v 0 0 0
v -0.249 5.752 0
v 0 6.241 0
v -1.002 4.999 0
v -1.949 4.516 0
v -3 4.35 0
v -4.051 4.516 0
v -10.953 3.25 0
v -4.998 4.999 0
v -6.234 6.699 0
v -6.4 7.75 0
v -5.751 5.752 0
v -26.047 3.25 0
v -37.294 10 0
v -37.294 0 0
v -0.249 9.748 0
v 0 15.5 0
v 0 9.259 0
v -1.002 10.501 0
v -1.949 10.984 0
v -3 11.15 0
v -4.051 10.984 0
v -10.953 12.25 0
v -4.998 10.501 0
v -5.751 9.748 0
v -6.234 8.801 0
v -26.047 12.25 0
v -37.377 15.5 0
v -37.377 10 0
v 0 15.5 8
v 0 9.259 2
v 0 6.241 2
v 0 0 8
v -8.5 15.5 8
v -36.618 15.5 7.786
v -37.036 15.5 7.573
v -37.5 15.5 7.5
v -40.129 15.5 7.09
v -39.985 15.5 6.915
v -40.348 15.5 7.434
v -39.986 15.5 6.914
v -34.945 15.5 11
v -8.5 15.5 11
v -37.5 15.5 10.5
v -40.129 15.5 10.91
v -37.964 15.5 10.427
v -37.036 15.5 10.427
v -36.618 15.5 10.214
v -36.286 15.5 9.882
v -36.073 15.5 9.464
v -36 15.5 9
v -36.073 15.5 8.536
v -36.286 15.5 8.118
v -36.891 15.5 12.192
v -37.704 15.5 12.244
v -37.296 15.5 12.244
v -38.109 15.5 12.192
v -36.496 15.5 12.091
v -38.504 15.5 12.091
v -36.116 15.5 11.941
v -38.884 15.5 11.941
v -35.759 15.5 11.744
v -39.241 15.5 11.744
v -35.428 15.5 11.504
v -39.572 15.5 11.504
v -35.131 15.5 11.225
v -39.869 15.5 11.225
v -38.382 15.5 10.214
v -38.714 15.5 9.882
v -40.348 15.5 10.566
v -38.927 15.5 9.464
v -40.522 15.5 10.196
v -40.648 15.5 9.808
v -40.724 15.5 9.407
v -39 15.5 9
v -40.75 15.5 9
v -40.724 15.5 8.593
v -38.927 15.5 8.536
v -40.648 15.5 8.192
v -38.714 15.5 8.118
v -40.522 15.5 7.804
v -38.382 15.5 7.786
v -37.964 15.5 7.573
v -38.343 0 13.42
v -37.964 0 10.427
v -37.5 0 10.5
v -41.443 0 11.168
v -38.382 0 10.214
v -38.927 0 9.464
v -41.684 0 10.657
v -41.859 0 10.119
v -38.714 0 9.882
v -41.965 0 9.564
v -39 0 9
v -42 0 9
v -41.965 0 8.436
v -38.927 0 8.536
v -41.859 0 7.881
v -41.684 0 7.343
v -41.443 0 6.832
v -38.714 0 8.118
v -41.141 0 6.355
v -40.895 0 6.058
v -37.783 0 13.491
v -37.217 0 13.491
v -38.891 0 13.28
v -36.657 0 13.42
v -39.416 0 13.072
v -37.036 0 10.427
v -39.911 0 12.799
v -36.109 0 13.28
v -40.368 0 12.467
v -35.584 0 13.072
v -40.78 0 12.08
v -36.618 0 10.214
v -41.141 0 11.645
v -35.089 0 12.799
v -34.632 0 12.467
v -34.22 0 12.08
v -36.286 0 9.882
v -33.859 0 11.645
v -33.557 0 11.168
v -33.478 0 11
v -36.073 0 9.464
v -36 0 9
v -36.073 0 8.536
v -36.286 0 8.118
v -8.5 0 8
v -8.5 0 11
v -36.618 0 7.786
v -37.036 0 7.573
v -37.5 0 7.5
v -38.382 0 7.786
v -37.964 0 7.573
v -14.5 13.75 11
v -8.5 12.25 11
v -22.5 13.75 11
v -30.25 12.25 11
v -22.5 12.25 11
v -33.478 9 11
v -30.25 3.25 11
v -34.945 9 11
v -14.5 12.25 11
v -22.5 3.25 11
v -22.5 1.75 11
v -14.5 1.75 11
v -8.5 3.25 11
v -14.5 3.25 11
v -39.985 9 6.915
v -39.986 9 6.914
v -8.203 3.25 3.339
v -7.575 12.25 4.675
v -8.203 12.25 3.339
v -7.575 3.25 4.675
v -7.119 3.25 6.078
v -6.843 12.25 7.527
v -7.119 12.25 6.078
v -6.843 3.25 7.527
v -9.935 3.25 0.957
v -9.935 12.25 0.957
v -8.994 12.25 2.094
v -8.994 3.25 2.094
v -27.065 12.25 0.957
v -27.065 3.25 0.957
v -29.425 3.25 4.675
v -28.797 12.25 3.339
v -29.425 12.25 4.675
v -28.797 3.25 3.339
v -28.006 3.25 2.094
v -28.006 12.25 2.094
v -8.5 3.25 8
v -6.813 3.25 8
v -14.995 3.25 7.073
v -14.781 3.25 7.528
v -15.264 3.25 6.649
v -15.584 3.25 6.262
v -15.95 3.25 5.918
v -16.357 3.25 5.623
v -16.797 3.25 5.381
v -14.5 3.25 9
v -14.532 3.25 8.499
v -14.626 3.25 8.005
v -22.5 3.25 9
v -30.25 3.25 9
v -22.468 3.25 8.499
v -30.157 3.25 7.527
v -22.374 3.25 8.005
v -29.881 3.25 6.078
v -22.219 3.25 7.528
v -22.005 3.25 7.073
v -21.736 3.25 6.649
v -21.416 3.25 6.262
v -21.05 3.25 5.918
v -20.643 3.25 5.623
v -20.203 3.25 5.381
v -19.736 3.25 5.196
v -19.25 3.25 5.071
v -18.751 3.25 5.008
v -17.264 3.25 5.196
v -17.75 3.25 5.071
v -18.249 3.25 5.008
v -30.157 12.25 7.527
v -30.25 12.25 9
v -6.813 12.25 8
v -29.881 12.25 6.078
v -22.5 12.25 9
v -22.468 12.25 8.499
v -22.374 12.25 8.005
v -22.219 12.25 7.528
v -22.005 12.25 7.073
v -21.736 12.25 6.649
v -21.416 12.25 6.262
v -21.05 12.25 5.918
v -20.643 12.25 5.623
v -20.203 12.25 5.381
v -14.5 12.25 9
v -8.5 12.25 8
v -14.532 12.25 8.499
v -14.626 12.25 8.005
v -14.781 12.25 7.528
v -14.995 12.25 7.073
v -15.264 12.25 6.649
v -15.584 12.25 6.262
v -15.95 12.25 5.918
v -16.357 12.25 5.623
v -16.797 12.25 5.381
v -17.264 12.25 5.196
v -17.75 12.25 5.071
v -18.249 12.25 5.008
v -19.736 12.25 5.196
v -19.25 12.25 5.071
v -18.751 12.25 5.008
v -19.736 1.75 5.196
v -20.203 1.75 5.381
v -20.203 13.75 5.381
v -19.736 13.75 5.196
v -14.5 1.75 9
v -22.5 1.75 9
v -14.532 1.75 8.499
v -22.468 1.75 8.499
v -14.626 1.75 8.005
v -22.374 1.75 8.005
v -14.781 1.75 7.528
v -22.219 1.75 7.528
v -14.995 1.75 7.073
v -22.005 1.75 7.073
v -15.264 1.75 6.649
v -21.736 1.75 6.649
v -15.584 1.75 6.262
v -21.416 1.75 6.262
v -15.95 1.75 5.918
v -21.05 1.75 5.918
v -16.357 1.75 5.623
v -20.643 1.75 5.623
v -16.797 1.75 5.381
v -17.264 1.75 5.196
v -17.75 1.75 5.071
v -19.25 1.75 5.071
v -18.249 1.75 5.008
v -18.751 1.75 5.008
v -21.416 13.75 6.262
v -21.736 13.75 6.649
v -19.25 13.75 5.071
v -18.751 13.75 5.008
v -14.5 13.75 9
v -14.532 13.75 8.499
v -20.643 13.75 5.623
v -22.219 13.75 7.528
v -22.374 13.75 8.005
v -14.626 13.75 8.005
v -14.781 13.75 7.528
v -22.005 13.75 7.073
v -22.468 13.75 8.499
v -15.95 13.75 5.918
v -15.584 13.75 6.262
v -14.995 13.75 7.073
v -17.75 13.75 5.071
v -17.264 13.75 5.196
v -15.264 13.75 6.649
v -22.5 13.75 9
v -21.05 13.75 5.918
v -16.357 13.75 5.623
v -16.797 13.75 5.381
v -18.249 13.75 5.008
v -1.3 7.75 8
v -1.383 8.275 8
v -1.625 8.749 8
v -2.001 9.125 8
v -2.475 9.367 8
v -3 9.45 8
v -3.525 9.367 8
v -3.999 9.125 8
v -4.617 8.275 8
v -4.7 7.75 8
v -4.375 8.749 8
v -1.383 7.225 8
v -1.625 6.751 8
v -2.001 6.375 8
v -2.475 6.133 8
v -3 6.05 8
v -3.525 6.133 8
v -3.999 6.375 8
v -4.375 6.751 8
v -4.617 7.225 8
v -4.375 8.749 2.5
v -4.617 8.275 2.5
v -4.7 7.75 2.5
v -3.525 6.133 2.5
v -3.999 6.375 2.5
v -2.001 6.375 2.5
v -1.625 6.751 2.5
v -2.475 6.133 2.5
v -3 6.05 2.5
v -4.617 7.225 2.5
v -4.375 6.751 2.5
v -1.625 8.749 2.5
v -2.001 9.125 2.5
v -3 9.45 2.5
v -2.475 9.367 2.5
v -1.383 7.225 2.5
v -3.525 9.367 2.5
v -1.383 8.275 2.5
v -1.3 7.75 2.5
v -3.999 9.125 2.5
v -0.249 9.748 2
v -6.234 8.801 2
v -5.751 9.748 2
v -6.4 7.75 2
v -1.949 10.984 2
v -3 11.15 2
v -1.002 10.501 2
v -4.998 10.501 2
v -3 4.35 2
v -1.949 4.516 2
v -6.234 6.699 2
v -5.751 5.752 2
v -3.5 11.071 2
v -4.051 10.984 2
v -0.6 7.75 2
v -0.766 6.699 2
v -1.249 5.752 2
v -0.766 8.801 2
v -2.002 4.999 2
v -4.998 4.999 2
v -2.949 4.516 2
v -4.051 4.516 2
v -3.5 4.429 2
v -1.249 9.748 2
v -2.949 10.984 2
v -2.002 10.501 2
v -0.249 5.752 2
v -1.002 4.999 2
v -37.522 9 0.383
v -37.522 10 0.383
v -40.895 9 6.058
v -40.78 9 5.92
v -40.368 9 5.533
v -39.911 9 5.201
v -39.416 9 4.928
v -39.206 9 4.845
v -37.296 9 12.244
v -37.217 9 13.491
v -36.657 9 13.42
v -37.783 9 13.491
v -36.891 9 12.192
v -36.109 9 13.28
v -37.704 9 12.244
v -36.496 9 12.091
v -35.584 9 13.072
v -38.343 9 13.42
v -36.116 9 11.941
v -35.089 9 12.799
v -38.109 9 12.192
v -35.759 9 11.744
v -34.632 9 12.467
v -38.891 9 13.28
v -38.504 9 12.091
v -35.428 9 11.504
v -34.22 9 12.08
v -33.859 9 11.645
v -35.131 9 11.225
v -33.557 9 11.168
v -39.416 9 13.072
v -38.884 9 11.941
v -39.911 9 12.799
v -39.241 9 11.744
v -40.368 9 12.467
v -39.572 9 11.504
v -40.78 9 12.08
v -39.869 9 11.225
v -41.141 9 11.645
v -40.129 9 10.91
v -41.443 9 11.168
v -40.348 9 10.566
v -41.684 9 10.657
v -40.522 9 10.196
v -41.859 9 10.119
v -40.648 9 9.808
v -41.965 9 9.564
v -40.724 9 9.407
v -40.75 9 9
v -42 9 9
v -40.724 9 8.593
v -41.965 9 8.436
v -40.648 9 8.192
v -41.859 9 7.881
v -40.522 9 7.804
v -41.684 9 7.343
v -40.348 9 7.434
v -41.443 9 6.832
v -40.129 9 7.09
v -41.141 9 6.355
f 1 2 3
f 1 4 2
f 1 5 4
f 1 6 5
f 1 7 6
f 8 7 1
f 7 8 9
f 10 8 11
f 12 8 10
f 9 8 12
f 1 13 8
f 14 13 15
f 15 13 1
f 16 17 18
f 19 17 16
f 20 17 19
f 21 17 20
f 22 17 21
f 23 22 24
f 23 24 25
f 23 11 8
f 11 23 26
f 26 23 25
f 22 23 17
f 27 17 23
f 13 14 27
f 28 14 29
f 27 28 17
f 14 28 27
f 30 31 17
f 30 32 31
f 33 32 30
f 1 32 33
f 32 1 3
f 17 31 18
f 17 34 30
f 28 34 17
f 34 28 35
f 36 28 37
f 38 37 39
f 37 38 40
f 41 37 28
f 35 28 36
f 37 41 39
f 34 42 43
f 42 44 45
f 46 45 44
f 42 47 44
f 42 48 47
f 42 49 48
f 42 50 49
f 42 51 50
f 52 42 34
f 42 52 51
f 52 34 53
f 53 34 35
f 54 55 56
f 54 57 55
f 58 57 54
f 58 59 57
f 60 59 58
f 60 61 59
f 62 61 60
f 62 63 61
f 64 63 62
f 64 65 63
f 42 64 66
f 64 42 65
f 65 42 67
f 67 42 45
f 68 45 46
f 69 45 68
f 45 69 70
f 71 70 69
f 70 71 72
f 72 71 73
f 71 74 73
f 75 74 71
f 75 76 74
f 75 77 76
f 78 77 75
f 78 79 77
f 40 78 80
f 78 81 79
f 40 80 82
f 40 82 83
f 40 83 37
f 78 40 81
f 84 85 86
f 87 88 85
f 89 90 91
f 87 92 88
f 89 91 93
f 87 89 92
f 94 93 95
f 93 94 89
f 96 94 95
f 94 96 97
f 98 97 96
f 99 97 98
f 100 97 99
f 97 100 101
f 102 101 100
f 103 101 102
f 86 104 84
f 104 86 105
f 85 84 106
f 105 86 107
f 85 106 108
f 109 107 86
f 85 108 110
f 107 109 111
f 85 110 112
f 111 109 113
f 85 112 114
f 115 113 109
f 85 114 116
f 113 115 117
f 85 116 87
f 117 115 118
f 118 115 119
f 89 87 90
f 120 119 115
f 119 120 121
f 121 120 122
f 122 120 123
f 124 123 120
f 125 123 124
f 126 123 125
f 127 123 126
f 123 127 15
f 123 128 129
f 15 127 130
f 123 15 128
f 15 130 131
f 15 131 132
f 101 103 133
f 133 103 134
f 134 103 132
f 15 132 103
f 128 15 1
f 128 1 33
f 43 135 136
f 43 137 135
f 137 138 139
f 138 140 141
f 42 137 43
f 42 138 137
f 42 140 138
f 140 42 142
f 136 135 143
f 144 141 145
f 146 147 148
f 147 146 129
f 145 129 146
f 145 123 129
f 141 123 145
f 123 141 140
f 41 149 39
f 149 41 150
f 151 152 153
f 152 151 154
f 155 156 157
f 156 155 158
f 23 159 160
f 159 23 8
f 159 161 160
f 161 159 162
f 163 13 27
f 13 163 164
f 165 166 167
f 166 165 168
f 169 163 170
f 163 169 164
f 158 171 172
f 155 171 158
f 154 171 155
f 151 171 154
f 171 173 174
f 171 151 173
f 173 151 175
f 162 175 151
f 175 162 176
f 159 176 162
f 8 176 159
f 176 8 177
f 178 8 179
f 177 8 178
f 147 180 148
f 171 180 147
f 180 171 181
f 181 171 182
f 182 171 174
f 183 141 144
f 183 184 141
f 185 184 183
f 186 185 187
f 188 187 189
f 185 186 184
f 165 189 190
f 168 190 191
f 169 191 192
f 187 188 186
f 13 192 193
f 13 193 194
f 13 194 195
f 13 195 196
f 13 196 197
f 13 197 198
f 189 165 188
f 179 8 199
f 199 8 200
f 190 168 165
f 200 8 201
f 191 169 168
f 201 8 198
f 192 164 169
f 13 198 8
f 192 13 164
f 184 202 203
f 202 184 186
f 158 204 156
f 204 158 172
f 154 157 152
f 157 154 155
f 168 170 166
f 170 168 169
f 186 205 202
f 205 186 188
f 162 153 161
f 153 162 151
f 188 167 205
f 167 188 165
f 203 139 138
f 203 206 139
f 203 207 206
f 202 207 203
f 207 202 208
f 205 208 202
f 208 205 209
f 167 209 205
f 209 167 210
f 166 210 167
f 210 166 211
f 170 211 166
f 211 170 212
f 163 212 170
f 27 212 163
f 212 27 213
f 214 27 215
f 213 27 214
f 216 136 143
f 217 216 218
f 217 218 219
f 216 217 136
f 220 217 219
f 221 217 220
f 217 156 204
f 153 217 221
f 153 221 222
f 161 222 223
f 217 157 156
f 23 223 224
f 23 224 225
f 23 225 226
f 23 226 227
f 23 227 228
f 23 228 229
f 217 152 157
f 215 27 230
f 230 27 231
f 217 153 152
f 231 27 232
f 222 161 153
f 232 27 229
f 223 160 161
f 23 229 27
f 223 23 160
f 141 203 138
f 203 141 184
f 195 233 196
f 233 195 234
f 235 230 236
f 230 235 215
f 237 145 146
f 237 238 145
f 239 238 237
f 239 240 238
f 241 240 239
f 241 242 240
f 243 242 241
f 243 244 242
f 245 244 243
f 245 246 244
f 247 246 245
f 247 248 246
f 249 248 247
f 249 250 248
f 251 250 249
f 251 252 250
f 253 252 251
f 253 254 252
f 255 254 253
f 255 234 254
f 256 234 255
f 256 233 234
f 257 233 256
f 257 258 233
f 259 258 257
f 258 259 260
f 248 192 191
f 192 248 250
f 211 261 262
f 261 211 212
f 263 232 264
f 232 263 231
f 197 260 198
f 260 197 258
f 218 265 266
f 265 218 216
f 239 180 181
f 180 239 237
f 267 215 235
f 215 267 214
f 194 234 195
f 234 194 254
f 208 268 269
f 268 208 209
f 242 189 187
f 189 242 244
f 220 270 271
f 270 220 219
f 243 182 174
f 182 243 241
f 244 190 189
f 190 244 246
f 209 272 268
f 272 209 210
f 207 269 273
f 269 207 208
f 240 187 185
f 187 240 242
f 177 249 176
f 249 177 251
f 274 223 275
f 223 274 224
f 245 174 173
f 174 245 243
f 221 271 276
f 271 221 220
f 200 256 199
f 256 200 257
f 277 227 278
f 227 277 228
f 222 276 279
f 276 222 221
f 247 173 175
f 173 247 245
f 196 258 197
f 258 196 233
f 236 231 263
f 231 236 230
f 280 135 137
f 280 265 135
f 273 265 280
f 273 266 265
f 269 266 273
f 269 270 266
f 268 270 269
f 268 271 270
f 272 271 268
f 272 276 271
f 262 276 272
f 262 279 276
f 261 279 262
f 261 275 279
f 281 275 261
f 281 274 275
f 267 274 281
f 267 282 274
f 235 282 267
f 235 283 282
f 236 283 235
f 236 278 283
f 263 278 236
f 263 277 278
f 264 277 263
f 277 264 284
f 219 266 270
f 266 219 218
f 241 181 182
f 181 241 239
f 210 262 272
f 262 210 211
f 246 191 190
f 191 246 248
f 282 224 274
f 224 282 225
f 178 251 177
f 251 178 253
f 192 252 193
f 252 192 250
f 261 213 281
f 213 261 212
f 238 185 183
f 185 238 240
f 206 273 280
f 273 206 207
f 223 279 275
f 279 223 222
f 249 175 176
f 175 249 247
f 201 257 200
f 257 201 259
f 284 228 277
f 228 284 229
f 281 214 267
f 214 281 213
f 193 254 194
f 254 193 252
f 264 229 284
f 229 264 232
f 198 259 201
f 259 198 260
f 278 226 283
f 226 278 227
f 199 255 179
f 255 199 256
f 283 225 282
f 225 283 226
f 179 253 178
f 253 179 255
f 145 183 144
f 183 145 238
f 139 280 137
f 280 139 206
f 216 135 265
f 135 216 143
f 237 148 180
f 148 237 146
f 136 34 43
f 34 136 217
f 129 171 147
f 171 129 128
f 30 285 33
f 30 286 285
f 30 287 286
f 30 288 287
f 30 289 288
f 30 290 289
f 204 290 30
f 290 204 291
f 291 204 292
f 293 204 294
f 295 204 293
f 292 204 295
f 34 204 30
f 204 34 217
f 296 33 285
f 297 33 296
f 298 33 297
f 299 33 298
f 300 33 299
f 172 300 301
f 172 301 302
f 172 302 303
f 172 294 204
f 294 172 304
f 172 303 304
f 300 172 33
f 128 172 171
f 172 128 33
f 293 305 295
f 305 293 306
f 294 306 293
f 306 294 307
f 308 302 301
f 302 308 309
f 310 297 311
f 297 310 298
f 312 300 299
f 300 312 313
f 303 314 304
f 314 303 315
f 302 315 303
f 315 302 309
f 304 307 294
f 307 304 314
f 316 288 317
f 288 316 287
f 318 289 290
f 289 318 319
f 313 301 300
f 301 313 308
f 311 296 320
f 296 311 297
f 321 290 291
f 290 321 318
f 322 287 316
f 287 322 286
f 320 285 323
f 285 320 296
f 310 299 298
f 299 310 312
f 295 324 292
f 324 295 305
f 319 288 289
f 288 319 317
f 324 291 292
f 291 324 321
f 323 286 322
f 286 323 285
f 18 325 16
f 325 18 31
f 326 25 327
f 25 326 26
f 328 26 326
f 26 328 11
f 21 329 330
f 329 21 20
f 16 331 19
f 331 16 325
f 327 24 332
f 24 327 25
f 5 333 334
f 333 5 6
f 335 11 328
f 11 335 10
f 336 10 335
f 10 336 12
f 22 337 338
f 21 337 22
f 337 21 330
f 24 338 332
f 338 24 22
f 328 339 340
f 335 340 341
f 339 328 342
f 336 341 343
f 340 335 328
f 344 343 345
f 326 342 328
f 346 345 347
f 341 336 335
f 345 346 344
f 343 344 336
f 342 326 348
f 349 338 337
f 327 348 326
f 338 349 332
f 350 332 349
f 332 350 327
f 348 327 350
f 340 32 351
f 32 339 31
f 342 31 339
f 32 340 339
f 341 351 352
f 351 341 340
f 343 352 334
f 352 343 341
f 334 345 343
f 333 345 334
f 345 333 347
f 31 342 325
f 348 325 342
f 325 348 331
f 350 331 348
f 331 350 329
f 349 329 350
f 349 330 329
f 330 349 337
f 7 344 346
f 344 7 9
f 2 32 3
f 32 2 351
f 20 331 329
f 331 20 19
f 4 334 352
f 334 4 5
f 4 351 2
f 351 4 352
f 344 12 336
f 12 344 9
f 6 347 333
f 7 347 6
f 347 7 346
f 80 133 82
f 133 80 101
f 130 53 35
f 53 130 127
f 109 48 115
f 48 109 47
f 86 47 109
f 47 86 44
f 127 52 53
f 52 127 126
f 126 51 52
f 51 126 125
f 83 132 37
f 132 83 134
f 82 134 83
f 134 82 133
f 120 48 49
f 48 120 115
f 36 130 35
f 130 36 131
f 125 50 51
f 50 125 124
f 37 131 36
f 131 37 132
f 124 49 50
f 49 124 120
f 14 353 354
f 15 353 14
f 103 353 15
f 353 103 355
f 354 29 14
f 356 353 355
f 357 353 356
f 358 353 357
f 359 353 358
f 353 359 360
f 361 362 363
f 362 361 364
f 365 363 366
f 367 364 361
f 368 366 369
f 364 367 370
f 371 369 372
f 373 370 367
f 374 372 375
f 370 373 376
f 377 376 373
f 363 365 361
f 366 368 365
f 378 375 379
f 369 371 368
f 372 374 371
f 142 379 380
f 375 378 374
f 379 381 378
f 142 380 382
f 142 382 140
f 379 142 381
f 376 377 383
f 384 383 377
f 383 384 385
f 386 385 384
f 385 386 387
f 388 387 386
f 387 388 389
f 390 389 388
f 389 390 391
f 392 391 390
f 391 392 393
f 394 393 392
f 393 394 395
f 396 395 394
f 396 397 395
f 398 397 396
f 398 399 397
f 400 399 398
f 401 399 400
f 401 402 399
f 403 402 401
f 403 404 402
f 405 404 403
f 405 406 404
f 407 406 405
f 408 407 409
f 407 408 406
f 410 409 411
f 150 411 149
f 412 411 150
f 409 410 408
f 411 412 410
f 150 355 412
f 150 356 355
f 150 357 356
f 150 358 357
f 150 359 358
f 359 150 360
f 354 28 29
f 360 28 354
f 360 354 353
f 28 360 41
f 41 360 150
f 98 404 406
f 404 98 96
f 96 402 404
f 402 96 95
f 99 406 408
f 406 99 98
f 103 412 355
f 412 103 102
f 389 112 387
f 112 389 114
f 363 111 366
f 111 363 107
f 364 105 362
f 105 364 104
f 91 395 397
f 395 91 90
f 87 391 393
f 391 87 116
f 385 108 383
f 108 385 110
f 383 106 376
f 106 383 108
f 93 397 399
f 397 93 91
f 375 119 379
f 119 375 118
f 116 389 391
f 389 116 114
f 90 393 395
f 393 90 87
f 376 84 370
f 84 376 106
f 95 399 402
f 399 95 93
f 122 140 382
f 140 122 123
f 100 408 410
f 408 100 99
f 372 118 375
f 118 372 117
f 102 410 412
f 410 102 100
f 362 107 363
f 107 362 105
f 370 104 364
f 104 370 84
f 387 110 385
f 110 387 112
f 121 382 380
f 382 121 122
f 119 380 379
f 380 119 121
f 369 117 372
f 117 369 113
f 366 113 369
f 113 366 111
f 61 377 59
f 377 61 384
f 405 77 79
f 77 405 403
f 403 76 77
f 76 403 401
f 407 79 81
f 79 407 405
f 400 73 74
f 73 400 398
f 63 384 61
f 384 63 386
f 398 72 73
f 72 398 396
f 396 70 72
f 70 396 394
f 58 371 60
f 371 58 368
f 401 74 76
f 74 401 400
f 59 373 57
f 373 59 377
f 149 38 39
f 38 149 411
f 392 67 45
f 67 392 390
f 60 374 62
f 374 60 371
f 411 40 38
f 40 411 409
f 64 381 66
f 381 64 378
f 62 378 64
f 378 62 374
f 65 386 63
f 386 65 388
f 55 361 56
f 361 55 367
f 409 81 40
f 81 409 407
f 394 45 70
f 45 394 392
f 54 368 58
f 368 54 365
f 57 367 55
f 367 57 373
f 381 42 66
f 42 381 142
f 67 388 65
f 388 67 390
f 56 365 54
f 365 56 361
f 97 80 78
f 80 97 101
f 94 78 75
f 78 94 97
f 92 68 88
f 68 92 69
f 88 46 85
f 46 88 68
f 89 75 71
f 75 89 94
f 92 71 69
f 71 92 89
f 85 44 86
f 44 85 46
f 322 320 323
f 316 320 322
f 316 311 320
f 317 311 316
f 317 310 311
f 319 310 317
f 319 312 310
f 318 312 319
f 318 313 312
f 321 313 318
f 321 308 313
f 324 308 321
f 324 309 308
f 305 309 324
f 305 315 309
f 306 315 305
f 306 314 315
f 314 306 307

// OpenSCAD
// file: lib/halfcube.scad
// библиотечная функция - прямоугольная призма
/*
 * a - вектор [x,y,z] - куб, в который вписана призма
 * orient - строка "x"/"y"/"z" - ориентация треугольной грани призмы
 * center - логическое true/false - позиционирование относительно центра или с угла
 *
 * Автор - Andrew Answer (Андрей Нуждов): http://answe.ru
 * Сделано для проекта SibRap: http://reprap.org/wiki/SibRap
 * GitHub: https://github.com/andrewanswer/sibrap
 */
module halfcube(a, orient, center) {
	translate(center==true?-a/2:0) {
		if (orient=="x")
			polyhedron (points = [[a[0],0,a[2]], [0,0,a[2]], [0,a[1],0], [0,0,0], [a[0],0,0], [a[0],a[1],0]], faces = [[1,3,2], [4,0,5], [3,1,4], [1,2,5], [1,0,4], [0,1,5],  [5,2,4], [4,2,3]]);
		if (orient=="y")
			polyhedron (points = [[0,a[1],a[2]], [0,0,a[2]], [0,a[1],0], [0,0,0], [a[0],0,0], [a[0],a[1],0]], faces = [[1,3,2], [1,2,0], [3,1,4], [0,2,5], [1,5,4], [1,0,5],  [5,2,4], [4,2,3]]);
		if (orient=="z")
			polyhedron (points = [[0,a[1],a[2]], [0,0,a[2]], [0,a[1],0], [0,0,0], [a[0],0,0], [a[0],0,a[2]]], faces = [[1,3,2], [1,2,0], [3,1,4], [0,2,5], [1,5,4], [1,0,5],  [5,2,4], [4,2,3]]);
	}
}

// test
/*
halfcube([10,20,30],"x",true);
halfcube([10,20,30],"y",true);
halfcube([10,20,30],"z",false);
*/
// file: config.scad
/**
 * Глобальный конфигурационный файл
 */
// качество цилиндров
$fn=30;

// избегание совпадения граней
DELTA=0.1;

// толщина рамы
FRAME=15;
// main file
include <config.scad>
use <lib/halfcube.scad>

x=42; // width
y=15.5; // depth
z=12; // height
z0=z-2-1;

d1=23.5;
d2=8;
d3=3.4;
d4=9;
d5=3;
x1=18.5;
h1=9;
h2=12;
z1=z-3;

d6=6.5;
hh=6.5;
d7=6.8;

module head_part03() {
// freecad positioning
//translate([18.5,8,60.5])rotate([180,90,0])
mirror([1,0,0])
union(){
	translate([4,y/2,2])cylinder(0.5,r=d7/2,$fn=20);
difference(){
	// main part
	cube([x,y,z]);
	translate([0,-1,z-1])cube([x,y+2,z]); // Отрезаем весь верх
	translate([x-4.5,-1,z1])cube([d4,y+2,d4]);
	translate([x-4.5,-1,z1])rotate([0,40,0])cube([d4,y+2,d4]);

	// bearing
	translate([x1,y/2+h1/2,z0])rotate([90,0,0])cylinder(h1,r=d1/2,$fn=50);
	translate([x1,y/2,d1/2+z0])cube([d1,h1,d1],true);
	translate([x1,y/2+h2/2,z0])rotate([90,0,0])cylinder(h2,r=d2/2,$fn=50);
	translate([x1,y/2,d2/2+z0])cube([d2,h2,d2],true);

	// top slot
	translate([-1,-1,z-4])cube([x1-9,y+2,5]);
	translate([3,y/2,-1])cylinder(z+2,r=d3/2,$fn=20);
	translate([3,y/2,-1])cylinder(3,r=d7/2,$fn=20);

	// bottom round cut
	translate([x-4.5,-1,z1])rotate([-90,0,0])cylinder(y+2,r=d5/2,$fn=20);
	translate([x+1,-1,-1])rotate([0,-90,0])halfcube([7.6+3,y+2-hh,6.3],"y");

	translate([x-4.5,-1,z1])rotate([0,40,0])cube([d4,y+2,d4]);
	translate([x+1,y-hh,-1])rotate([0,-90,0])halfcube([11.9+4,hh+1,6],"y");
}

// bottom round thing
difference(){
	union(){
		translate([x-4.5,0,z1])rotate([-90,0,0])cylinder(y-hh,r=d4/2,$fn=50);
		translate([x-4.5,0,z1])rotate([-90,0,0])cylinder(y,r=d6/2,$fn=50);
	}
	translate([x-4.5,-1,z1])rotate([-90,0,0])cylinder(y+2,r=d5/2,$fn=20);
}
}
}

head_part03();
